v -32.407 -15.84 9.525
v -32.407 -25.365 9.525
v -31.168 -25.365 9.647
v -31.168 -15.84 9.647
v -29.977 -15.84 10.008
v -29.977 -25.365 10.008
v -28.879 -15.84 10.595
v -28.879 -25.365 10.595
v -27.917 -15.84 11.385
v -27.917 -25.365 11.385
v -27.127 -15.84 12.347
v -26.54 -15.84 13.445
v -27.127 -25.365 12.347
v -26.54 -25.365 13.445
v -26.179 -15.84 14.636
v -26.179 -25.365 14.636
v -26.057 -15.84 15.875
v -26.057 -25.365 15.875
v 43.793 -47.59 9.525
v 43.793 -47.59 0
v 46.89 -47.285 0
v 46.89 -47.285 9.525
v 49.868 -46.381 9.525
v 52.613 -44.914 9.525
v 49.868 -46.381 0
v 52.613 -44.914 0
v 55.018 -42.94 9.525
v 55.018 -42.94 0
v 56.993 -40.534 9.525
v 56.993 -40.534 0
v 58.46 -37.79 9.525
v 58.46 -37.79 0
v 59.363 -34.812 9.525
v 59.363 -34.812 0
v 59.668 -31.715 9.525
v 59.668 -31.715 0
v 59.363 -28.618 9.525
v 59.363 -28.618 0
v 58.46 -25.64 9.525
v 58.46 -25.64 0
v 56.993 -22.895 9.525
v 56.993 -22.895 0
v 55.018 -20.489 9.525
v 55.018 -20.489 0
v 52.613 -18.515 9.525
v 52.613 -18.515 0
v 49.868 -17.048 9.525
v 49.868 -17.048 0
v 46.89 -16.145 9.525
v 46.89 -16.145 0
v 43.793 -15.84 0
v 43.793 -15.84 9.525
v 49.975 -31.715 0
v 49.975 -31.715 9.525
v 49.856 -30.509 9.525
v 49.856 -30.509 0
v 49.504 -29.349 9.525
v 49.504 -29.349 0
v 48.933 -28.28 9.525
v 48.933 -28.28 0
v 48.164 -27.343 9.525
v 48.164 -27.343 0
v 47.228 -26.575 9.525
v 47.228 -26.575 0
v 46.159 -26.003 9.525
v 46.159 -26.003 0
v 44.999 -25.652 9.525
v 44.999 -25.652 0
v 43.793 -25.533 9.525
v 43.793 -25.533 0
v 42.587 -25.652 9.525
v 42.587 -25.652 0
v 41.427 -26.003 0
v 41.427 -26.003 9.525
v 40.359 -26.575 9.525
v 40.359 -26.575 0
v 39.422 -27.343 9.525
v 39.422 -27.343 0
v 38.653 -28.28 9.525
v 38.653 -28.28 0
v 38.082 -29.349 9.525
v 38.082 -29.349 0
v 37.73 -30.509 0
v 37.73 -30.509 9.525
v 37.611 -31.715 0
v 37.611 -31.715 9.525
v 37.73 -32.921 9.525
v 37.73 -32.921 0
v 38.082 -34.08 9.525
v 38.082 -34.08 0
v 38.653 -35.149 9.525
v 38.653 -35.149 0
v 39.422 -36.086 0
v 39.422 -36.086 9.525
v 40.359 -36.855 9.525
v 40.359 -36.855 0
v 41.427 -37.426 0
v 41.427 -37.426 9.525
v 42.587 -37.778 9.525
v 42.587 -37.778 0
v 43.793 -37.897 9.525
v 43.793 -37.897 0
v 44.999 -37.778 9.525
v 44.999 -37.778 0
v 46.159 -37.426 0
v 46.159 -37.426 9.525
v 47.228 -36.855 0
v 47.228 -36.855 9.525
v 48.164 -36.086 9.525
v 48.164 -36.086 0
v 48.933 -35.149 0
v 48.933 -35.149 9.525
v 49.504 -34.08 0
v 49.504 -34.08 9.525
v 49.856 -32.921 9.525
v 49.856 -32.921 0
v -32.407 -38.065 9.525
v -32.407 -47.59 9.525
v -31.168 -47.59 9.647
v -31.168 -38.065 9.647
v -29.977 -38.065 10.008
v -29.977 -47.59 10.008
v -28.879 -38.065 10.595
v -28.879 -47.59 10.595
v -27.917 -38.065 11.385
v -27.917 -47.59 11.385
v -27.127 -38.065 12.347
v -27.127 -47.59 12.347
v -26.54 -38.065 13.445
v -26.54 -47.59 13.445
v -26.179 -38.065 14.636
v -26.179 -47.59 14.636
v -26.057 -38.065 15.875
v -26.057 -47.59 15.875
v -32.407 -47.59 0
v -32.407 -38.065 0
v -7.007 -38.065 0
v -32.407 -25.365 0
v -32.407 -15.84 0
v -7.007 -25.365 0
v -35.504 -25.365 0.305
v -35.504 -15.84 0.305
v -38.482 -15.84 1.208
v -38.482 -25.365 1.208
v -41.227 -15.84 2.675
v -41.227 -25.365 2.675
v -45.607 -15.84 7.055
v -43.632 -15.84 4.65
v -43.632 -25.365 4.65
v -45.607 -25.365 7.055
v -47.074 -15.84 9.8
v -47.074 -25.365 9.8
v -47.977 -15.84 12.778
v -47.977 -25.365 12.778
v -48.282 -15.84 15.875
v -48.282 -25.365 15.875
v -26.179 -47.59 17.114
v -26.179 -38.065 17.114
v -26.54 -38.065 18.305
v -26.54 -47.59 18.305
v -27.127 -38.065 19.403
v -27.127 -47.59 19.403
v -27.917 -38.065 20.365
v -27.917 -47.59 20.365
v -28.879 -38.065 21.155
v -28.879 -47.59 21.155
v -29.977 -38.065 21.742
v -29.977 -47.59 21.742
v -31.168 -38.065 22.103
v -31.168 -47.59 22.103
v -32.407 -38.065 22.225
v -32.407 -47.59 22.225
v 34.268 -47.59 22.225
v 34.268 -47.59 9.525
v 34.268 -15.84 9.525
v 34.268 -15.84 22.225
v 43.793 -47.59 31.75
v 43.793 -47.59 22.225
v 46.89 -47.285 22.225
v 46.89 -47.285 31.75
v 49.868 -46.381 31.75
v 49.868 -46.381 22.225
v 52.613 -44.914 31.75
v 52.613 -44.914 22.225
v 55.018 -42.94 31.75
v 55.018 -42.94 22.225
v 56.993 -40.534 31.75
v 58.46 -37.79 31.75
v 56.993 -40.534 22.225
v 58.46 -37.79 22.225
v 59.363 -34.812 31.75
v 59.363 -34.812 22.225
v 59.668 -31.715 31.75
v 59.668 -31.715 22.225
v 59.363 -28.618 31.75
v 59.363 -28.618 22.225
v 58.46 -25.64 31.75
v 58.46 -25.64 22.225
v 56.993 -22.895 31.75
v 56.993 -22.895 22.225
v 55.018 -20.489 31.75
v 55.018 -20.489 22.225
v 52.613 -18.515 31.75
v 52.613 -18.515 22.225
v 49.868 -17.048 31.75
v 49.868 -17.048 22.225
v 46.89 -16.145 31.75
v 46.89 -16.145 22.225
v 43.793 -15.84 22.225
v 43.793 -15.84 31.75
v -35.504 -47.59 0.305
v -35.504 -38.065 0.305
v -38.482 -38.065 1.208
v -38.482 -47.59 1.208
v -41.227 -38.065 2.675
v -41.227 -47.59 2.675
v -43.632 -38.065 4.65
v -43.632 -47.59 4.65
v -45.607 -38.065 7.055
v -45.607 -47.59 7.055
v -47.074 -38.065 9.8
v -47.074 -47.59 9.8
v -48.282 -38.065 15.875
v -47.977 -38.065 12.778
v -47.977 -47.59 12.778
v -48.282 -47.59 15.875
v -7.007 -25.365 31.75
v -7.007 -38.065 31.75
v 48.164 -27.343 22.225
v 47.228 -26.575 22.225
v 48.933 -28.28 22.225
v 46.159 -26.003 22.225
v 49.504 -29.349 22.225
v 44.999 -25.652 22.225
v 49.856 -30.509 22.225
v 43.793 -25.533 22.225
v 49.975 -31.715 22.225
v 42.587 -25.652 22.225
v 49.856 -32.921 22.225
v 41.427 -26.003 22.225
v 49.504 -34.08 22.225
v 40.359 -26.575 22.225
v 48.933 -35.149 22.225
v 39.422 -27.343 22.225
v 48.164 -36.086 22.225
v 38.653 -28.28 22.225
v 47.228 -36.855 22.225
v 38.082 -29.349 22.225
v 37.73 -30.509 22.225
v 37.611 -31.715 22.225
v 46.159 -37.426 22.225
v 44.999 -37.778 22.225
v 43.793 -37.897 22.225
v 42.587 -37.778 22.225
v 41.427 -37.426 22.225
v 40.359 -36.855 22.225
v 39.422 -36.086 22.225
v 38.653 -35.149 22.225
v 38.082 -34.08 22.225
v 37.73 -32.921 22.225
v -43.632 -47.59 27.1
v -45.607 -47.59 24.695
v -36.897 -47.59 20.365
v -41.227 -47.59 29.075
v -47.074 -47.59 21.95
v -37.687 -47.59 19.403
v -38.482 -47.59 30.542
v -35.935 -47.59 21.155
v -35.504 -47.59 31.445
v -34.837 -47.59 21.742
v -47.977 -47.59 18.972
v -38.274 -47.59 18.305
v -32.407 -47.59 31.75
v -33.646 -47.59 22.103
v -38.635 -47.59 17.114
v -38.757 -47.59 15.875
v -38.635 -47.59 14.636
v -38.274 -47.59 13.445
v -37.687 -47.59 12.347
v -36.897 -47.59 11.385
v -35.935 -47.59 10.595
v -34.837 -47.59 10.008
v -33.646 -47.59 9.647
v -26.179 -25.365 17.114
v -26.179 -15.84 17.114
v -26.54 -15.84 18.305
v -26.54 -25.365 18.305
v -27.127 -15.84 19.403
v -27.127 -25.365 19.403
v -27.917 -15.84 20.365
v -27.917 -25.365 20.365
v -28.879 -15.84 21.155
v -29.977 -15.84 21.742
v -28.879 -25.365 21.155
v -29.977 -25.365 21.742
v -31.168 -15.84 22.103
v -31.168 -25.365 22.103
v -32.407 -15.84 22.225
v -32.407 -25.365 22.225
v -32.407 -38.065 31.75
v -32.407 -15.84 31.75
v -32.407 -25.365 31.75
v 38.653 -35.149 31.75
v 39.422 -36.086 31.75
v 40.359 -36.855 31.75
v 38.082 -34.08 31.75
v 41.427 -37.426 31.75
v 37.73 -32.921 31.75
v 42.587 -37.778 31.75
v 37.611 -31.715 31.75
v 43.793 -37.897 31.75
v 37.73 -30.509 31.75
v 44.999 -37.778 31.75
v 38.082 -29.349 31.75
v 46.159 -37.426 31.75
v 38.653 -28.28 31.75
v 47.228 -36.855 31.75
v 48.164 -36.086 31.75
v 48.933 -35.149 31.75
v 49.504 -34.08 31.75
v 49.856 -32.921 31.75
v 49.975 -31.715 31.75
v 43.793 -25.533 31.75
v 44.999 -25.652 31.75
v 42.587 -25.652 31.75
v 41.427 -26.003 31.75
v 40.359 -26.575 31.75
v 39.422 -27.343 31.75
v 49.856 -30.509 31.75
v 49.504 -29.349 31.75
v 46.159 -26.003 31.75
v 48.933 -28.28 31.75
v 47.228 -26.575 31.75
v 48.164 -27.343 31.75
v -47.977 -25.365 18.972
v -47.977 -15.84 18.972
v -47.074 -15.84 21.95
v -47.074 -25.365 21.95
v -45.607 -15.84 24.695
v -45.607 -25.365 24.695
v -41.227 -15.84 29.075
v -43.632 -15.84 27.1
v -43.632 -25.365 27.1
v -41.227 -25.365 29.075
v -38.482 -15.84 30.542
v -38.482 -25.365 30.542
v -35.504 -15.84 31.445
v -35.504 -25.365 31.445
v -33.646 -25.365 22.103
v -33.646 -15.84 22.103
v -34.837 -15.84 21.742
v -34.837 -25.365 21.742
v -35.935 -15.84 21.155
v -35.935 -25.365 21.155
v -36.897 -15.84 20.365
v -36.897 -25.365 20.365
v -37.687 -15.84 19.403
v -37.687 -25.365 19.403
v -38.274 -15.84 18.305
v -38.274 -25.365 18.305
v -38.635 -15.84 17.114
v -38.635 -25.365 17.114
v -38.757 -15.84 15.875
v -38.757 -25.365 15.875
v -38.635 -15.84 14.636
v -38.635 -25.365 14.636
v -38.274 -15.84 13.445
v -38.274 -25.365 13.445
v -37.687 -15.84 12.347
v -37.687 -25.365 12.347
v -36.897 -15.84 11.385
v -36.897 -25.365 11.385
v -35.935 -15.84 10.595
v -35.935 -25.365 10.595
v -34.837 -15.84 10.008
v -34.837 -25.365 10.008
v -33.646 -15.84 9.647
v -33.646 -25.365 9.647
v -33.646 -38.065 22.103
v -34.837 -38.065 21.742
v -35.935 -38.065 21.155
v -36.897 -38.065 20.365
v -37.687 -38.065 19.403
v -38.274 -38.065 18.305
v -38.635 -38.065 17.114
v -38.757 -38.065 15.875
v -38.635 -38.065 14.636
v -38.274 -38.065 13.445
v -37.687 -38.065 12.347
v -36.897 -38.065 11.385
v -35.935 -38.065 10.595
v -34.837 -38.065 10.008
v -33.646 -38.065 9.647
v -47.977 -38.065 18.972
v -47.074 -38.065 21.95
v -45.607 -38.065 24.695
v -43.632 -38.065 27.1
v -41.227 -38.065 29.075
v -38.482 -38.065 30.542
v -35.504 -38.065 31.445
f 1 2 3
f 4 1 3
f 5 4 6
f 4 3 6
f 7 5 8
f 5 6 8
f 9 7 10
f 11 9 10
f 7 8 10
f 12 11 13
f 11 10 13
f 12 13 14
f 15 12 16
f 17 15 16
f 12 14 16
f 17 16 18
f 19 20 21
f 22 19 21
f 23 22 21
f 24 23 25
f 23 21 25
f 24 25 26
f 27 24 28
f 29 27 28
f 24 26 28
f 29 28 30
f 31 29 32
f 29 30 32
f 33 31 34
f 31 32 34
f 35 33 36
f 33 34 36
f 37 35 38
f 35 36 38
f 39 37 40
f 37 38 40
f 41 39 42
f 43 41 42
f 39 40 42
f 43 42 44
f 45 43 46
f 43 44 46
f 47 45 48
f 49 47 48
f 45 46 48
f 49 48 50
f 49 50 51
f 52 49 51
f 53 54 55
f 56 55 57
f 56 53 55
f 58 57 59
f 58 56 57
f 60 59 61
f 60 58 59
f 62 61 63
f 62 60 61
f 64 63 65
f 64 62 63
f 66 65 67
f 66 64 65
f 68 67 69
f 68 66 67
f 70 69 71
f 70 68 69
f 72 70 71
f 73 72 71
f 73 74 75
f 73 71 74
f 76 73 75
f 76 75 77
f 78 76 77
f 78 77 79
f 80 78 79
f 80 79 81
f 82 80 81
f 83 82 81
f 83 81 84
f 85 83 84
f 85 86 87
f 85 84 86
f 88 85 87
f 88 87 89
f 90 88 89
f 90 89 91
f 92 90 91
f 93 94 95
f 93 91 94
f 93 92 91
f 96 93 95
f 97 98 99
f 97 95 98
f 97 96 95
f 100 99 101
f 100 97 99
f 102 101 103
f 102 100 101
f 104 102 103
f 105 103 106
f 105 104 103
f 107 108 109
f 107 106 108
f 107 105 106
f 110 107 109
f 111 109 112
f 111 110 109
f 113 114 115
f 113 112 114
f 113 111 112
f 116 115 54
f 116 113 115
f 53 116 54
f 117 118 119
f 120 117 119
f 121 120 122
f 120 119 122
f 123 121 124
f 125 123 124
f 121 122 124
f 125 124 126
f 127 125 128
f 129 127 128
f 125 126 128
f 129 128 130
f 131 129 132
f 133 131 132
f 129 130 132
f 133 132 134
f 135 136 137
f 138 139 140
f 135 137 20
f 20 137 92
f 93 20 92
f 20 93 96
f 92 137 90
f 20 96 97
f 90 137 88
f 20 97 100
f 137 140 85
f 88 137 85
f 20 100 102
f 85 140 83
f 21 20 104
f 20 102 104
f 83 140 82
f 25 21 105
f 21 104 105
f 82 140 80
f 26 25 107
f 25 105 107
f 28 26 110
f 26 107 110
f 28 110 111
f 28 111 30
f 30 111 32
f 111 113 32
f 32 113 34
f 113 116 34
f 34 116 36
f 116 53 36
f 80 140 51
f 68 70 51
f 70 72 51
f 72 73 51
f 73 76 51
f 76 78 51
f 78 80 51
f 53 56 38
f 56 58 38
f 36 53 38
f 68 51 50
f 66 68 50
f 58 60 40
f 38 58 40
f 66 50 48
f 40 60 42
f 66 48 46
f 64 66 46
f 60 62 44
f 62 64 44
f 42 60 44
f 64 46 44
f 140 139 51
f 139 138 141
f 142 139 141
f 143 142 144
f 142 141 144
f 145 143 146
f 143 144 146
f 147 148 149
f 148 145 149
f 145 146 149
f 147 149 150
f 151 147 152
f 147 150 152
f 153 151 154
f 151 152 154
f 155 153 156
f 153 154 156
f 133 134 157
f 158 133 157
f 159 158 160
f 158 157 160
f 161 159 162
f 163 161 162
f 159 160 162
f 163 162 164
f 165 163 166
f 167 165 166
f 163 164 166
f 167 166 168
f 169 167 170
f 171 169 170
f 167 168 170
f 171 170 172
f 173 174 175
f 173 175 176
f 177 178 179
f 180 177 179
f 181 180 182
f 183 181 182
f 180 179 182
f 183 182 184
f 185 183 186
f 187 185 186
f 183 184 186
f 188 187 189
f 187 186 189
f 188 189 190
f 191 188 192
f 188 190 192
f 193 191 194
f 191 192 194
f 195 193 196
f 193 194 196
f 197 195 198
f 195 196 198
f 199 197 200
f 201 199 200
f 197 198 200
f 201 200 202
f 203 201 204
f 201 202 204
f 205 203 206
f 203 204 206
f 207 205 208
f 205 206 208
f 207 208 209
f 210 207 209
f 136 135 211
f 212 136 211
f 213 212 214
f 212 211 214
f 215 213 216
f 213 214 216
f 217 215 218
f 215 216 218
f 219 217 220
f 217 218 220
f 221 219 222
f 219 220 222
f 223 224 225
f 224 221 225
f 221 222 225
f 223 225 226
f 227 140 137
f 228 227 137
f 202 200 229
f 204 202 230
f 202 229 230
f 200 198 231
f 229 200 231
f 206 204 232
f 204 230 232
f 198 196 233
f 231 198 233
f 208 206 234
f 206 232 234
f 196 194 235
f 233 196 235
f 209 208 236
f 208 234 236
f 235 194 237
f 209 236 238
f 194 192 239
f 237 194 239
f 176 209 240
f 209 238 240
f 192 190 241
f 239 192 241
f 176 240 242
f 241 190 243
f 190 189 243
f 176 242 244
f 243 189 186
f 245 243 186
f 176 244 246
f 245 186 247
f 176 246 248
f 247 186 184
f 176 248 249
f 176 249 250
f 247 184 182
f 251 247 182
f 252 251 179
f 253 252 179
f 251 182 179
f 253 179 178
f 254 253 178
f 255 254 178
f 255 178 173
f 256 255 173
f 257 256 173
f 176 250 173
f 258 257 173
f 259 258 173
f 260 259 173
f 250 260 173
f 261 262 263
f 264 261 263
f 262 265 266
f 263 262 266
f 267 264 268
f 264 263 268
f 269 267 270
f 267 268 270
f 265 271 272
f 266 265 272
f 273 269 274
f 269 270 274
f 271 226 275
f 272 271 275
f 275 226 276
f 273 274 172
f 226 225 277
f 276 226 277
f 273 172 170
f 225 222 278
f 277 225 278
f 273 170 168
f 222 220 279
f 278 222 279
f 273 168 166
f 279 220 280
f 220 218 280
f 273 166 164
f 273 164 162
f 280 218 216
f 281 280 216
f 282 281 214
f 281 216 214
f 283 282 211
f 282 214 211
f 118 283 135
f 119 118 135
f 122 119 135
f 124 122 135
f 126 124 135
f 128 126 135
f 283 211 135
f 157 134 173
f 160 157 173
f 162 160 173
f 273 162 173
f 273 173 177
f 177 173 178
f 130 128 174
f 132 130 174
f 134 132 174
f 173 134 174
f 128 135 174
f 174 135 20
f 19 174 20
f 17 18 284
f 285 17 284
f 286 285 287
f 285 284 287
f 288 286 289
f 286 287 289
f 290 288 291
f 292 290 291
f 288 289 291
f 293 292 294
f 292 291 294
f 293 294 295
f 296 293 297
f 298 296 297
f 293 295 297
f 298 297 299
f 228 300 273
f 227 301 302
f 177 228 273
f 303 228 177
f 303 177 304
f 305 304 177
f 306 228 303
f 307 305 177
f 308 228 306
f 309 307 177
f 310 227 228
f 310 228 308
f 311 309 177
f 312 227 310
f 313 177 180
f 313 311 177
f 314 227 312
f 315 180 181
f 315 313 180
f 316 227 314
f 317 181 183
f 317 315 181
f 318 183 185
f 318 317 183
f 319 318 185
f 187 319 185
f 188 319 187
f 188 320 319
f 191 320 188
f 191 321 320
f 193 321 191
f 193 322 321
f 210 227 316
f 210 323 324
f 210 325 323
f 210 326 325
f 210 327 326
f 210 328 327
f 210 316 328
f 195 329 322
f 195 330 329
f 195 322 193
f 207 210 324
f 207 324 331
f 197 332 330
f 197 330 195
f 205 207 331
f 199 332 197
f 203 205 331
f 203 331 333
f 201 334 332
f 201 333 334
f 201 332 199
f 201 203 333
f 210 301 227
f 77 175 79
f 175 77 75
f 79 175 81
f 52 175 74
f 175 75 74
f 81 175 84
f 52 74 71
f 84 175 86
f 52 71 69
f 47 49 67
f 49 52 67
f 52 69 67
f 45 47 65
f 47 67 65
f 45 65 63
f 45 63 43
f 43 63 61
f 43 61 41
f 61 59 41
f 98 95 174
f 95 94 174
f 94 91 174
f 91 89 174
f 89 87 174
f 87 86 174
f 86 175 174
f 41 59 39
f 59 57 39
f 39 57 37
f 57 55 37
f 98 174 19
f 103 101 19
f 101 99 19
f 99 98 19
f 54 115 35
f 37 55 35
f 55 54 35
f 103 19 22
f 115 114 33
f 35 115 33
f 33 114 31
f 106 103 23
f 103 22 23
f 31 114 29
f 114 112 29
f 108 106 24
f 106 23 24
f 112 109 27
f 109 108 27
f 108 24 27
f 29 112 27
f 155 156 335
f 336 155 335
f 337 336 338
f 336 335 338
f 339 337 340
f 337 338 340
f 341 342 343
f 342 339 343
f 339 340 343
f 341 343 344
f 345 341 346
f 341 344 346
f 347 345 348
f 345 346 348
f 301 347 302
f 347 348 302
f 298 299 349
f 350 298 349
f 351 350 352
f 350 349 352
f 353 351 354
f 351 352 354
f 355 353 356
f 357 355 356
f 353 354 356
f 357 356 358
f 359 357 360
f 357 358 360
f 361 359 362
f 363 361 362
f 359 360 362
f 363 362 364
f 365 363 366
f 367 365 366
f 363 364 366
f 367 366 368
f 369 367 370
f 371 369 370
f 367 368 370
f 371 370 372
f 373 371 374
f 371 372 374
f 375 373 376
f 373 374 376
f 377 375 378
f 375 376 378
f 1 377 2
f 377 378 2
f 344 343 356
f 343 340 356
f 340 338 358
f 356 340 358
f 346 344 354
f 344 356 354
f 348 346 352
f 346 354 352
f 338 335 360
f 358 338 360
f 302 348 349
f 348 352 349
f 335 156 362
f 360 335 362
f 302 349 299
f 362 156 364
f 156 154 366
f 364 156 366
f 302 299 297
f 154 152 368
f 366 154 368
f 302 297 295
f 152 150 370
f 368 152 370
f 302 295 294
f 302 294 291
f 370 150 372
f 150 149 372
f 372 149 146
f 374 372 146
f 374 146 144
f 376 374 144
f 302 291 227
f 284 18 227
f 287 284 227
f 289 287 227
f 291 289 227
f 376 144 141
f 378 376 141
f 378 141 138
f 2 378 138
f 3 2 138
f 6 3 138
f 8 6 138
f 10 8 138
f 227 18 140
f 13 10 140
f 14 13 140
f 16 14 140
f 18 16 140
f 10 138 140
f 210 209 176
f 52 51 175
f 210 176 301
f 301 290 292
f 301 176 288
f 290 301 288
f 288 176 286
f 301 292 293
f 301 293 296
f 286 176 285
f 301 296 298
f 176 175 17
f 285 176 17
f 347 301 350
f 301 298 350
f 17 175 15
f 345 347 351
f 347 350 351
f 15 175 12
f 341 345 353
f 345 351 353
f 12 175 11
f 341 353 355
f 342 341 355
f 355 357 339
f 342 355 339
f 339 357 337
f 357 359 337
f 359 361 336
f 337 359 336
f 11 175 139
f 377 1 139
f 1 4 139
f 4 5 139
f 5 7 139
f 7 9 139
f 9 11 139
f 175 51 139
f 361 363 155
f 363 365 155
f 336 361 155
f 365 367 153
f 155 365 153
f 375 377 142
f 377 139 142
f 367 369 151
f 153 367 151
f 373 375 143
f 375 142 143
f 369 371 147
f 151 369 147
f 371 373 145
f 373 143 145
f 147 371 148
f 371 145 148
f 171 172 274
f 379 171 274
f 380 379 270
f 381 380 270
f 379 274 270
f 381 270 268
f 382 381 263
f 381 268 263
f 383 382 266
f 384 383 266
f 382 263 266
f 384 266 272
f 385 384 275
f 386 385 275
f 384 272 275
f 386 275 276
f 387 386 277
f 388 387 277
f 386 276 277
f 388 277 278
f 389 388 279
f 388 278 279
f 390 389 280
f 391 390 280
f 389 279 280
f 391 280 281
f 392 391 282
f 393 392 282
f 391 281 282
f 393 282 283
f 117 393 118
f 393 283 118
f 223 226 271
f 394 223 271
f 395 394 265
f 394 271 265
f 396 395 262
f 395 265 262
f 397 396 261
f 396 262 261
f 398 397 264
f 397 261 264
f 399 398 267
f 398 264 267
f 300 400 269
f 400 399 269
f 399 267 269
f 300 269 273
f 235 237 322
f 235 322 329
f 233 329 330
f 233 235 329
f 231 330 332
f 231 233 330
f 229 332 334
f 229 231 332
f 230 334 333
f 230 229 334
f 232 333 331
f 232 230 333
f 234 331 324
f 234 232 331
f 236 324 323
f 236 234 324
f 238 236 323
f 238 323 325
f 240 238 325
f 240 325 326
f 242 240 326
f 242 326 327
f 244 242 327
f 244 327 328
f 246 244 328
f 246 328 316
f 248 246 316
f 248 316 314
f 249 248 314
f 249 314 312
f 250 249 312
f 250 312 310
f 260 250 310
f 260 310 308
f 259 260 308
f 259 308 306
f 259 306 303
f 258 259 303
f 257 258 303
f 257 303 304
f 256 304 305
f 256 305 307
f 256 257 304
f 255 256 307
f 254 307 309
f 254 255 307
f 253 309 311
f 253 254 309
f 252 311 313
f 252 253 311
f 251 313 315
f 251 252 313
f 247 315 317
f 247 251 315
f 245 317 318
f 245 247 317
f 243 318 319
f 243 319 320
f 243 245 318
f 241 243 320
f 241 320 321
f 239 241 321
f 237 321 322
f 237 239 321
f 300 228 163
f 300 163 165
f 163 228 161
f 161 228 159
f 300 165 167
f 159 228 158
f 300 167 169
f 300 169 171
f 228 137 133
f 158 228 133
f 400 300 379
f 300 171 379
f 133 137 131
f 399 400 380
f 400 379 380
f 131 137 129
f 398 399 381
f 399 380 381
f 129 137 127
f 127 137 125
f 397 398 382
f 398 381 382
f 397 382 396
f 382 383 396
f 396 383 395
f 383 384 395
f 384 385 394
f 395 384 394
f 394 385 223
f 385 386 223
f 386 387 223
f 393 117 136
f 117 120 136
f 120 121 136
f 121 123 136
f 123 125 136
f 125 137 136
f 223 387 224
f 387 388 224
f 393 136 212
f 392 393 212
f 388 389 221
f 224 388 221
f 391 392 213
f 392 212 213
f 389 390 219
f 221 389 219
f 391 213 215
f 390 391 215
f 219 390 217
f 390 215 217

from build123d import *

# Parameters (mm, degrees)
F0_R     = 6.1819299208
F1_DEPTH = 31.75
F3_DEPTH = 31.751
F2_W     = 15.875
F2_H     = 12.7
F2_W_2   = 9.525
F4_DEPTH = 31.751
F5_DEPTH = 31.751


with BuildPart() as f1:
    # F0 (on Top) → F1 (new body)
    with BuildSketch(Plane.XY):
        with BuildLine():
            Line((43.7930202991, -15.8396554504), (-48.2819797009, -15.8396554504))
            Line((-48.2819797009, -15.8396554504), (-48.2819797009, -25.3646554504))
            Line((-48.2819797009, -25.3646554504), (-7.0069797009, -25.3646554504))
            Line((-7.0069797009, -25.3646554504), (-7.0069797009, -38.0646554504))
            Line((-7.0069797009, -38.0646554504), (-48.2819797009, -38.0646554504))
            Line((-48.2819797009, -38.0646554504), (-48.2819797009, -47.5896554504))
            Line((-48.2819797009, -47.5896554504), (43.7930202991, -47.5896554504))
            ThreePointArc((43.7930202991, -47.5896554504), (59.6680202991, -31.7146554504), (43.7930202991, -15.8396554504))
        make_face()
        with Locations((43.7930202991, -31.7146554504)):
            Circle(F0_R, mode=Mode.SUBTRACT)
    extrude(amount=F1_DEPTH)

    # F2 (on face) → F3 (cut, through all)
    with BuildSketch(Plane.XZ.offset(47.5896554504)):
        with BuildLine():
            Line((-32.4069797009, 9.525), (-32.4069797009, 22.225))
            ThreePointArc((-32.4069797009, 22.225), (-38.7569797009, 15.875), (-32.4069797009, 9.525))
        make_face()
        with BuildLine():
            ThreePointArc((-26.0569797009, 15.875), (-27.9168516404, 20.3651280605), (-32.4069797009, 22.225))
            Line((-32.4069797009, 22.225), (-32.4069797009, 9.525))
            ThreePointArc((-32.4069797009, 9.525), (-27.9168516404, 11.3848719395), (-26.0569797009, 15.875))
        make_face()
    extrude(amount=-F3_DEPTH, mode=Mode.SUBTRACT)

    # F2 (on face) → F4 (cut, through all)
    with BuildSketch(Plane.XZ.offset(47.5896554504)):
        with Locations((51.7305202991, 15.875)):
            Rectangle(F2_W, F2_H)
        with Locations((39.0305202991, 15.875)):
            Rectangle(F2_W_2, F2_H)
    extrude(amount=-F4_DEPTH, mode=Mode.SUBTRACT)

    # F2 (on face) → F5 (cut, through all)
    with BuildSketch(Plane.XZ.offset(47.5896554504)):
        with BuildLine():
            ThreePointArc((-48.2819797009, 15.875), (-43.6322998523, 27.1003201513), (-32.4069797009, 31.75))
            Line((-32.4069797009, 31.75), (-48.2819797009, 31.75))
            Line((-48.2819797009, 31.75), (-48.2819797009, 15.875))
        make_face()
        with BuildLine():
            ThreePointArc((-32.4069797009, 0), (-43.6322998523, 4.6496798487), (-48.2819797009, 15.875))
            Line((-48.2819797009, 15.875), (-48.2819797009, 0))
            Line((-48.2819797009, 0), (-32.4069797009, 0))
        make_face()
    extrude(amount=-F5_DEPTH, mode=Mode.SUBTRACT)


solid = f1.part
